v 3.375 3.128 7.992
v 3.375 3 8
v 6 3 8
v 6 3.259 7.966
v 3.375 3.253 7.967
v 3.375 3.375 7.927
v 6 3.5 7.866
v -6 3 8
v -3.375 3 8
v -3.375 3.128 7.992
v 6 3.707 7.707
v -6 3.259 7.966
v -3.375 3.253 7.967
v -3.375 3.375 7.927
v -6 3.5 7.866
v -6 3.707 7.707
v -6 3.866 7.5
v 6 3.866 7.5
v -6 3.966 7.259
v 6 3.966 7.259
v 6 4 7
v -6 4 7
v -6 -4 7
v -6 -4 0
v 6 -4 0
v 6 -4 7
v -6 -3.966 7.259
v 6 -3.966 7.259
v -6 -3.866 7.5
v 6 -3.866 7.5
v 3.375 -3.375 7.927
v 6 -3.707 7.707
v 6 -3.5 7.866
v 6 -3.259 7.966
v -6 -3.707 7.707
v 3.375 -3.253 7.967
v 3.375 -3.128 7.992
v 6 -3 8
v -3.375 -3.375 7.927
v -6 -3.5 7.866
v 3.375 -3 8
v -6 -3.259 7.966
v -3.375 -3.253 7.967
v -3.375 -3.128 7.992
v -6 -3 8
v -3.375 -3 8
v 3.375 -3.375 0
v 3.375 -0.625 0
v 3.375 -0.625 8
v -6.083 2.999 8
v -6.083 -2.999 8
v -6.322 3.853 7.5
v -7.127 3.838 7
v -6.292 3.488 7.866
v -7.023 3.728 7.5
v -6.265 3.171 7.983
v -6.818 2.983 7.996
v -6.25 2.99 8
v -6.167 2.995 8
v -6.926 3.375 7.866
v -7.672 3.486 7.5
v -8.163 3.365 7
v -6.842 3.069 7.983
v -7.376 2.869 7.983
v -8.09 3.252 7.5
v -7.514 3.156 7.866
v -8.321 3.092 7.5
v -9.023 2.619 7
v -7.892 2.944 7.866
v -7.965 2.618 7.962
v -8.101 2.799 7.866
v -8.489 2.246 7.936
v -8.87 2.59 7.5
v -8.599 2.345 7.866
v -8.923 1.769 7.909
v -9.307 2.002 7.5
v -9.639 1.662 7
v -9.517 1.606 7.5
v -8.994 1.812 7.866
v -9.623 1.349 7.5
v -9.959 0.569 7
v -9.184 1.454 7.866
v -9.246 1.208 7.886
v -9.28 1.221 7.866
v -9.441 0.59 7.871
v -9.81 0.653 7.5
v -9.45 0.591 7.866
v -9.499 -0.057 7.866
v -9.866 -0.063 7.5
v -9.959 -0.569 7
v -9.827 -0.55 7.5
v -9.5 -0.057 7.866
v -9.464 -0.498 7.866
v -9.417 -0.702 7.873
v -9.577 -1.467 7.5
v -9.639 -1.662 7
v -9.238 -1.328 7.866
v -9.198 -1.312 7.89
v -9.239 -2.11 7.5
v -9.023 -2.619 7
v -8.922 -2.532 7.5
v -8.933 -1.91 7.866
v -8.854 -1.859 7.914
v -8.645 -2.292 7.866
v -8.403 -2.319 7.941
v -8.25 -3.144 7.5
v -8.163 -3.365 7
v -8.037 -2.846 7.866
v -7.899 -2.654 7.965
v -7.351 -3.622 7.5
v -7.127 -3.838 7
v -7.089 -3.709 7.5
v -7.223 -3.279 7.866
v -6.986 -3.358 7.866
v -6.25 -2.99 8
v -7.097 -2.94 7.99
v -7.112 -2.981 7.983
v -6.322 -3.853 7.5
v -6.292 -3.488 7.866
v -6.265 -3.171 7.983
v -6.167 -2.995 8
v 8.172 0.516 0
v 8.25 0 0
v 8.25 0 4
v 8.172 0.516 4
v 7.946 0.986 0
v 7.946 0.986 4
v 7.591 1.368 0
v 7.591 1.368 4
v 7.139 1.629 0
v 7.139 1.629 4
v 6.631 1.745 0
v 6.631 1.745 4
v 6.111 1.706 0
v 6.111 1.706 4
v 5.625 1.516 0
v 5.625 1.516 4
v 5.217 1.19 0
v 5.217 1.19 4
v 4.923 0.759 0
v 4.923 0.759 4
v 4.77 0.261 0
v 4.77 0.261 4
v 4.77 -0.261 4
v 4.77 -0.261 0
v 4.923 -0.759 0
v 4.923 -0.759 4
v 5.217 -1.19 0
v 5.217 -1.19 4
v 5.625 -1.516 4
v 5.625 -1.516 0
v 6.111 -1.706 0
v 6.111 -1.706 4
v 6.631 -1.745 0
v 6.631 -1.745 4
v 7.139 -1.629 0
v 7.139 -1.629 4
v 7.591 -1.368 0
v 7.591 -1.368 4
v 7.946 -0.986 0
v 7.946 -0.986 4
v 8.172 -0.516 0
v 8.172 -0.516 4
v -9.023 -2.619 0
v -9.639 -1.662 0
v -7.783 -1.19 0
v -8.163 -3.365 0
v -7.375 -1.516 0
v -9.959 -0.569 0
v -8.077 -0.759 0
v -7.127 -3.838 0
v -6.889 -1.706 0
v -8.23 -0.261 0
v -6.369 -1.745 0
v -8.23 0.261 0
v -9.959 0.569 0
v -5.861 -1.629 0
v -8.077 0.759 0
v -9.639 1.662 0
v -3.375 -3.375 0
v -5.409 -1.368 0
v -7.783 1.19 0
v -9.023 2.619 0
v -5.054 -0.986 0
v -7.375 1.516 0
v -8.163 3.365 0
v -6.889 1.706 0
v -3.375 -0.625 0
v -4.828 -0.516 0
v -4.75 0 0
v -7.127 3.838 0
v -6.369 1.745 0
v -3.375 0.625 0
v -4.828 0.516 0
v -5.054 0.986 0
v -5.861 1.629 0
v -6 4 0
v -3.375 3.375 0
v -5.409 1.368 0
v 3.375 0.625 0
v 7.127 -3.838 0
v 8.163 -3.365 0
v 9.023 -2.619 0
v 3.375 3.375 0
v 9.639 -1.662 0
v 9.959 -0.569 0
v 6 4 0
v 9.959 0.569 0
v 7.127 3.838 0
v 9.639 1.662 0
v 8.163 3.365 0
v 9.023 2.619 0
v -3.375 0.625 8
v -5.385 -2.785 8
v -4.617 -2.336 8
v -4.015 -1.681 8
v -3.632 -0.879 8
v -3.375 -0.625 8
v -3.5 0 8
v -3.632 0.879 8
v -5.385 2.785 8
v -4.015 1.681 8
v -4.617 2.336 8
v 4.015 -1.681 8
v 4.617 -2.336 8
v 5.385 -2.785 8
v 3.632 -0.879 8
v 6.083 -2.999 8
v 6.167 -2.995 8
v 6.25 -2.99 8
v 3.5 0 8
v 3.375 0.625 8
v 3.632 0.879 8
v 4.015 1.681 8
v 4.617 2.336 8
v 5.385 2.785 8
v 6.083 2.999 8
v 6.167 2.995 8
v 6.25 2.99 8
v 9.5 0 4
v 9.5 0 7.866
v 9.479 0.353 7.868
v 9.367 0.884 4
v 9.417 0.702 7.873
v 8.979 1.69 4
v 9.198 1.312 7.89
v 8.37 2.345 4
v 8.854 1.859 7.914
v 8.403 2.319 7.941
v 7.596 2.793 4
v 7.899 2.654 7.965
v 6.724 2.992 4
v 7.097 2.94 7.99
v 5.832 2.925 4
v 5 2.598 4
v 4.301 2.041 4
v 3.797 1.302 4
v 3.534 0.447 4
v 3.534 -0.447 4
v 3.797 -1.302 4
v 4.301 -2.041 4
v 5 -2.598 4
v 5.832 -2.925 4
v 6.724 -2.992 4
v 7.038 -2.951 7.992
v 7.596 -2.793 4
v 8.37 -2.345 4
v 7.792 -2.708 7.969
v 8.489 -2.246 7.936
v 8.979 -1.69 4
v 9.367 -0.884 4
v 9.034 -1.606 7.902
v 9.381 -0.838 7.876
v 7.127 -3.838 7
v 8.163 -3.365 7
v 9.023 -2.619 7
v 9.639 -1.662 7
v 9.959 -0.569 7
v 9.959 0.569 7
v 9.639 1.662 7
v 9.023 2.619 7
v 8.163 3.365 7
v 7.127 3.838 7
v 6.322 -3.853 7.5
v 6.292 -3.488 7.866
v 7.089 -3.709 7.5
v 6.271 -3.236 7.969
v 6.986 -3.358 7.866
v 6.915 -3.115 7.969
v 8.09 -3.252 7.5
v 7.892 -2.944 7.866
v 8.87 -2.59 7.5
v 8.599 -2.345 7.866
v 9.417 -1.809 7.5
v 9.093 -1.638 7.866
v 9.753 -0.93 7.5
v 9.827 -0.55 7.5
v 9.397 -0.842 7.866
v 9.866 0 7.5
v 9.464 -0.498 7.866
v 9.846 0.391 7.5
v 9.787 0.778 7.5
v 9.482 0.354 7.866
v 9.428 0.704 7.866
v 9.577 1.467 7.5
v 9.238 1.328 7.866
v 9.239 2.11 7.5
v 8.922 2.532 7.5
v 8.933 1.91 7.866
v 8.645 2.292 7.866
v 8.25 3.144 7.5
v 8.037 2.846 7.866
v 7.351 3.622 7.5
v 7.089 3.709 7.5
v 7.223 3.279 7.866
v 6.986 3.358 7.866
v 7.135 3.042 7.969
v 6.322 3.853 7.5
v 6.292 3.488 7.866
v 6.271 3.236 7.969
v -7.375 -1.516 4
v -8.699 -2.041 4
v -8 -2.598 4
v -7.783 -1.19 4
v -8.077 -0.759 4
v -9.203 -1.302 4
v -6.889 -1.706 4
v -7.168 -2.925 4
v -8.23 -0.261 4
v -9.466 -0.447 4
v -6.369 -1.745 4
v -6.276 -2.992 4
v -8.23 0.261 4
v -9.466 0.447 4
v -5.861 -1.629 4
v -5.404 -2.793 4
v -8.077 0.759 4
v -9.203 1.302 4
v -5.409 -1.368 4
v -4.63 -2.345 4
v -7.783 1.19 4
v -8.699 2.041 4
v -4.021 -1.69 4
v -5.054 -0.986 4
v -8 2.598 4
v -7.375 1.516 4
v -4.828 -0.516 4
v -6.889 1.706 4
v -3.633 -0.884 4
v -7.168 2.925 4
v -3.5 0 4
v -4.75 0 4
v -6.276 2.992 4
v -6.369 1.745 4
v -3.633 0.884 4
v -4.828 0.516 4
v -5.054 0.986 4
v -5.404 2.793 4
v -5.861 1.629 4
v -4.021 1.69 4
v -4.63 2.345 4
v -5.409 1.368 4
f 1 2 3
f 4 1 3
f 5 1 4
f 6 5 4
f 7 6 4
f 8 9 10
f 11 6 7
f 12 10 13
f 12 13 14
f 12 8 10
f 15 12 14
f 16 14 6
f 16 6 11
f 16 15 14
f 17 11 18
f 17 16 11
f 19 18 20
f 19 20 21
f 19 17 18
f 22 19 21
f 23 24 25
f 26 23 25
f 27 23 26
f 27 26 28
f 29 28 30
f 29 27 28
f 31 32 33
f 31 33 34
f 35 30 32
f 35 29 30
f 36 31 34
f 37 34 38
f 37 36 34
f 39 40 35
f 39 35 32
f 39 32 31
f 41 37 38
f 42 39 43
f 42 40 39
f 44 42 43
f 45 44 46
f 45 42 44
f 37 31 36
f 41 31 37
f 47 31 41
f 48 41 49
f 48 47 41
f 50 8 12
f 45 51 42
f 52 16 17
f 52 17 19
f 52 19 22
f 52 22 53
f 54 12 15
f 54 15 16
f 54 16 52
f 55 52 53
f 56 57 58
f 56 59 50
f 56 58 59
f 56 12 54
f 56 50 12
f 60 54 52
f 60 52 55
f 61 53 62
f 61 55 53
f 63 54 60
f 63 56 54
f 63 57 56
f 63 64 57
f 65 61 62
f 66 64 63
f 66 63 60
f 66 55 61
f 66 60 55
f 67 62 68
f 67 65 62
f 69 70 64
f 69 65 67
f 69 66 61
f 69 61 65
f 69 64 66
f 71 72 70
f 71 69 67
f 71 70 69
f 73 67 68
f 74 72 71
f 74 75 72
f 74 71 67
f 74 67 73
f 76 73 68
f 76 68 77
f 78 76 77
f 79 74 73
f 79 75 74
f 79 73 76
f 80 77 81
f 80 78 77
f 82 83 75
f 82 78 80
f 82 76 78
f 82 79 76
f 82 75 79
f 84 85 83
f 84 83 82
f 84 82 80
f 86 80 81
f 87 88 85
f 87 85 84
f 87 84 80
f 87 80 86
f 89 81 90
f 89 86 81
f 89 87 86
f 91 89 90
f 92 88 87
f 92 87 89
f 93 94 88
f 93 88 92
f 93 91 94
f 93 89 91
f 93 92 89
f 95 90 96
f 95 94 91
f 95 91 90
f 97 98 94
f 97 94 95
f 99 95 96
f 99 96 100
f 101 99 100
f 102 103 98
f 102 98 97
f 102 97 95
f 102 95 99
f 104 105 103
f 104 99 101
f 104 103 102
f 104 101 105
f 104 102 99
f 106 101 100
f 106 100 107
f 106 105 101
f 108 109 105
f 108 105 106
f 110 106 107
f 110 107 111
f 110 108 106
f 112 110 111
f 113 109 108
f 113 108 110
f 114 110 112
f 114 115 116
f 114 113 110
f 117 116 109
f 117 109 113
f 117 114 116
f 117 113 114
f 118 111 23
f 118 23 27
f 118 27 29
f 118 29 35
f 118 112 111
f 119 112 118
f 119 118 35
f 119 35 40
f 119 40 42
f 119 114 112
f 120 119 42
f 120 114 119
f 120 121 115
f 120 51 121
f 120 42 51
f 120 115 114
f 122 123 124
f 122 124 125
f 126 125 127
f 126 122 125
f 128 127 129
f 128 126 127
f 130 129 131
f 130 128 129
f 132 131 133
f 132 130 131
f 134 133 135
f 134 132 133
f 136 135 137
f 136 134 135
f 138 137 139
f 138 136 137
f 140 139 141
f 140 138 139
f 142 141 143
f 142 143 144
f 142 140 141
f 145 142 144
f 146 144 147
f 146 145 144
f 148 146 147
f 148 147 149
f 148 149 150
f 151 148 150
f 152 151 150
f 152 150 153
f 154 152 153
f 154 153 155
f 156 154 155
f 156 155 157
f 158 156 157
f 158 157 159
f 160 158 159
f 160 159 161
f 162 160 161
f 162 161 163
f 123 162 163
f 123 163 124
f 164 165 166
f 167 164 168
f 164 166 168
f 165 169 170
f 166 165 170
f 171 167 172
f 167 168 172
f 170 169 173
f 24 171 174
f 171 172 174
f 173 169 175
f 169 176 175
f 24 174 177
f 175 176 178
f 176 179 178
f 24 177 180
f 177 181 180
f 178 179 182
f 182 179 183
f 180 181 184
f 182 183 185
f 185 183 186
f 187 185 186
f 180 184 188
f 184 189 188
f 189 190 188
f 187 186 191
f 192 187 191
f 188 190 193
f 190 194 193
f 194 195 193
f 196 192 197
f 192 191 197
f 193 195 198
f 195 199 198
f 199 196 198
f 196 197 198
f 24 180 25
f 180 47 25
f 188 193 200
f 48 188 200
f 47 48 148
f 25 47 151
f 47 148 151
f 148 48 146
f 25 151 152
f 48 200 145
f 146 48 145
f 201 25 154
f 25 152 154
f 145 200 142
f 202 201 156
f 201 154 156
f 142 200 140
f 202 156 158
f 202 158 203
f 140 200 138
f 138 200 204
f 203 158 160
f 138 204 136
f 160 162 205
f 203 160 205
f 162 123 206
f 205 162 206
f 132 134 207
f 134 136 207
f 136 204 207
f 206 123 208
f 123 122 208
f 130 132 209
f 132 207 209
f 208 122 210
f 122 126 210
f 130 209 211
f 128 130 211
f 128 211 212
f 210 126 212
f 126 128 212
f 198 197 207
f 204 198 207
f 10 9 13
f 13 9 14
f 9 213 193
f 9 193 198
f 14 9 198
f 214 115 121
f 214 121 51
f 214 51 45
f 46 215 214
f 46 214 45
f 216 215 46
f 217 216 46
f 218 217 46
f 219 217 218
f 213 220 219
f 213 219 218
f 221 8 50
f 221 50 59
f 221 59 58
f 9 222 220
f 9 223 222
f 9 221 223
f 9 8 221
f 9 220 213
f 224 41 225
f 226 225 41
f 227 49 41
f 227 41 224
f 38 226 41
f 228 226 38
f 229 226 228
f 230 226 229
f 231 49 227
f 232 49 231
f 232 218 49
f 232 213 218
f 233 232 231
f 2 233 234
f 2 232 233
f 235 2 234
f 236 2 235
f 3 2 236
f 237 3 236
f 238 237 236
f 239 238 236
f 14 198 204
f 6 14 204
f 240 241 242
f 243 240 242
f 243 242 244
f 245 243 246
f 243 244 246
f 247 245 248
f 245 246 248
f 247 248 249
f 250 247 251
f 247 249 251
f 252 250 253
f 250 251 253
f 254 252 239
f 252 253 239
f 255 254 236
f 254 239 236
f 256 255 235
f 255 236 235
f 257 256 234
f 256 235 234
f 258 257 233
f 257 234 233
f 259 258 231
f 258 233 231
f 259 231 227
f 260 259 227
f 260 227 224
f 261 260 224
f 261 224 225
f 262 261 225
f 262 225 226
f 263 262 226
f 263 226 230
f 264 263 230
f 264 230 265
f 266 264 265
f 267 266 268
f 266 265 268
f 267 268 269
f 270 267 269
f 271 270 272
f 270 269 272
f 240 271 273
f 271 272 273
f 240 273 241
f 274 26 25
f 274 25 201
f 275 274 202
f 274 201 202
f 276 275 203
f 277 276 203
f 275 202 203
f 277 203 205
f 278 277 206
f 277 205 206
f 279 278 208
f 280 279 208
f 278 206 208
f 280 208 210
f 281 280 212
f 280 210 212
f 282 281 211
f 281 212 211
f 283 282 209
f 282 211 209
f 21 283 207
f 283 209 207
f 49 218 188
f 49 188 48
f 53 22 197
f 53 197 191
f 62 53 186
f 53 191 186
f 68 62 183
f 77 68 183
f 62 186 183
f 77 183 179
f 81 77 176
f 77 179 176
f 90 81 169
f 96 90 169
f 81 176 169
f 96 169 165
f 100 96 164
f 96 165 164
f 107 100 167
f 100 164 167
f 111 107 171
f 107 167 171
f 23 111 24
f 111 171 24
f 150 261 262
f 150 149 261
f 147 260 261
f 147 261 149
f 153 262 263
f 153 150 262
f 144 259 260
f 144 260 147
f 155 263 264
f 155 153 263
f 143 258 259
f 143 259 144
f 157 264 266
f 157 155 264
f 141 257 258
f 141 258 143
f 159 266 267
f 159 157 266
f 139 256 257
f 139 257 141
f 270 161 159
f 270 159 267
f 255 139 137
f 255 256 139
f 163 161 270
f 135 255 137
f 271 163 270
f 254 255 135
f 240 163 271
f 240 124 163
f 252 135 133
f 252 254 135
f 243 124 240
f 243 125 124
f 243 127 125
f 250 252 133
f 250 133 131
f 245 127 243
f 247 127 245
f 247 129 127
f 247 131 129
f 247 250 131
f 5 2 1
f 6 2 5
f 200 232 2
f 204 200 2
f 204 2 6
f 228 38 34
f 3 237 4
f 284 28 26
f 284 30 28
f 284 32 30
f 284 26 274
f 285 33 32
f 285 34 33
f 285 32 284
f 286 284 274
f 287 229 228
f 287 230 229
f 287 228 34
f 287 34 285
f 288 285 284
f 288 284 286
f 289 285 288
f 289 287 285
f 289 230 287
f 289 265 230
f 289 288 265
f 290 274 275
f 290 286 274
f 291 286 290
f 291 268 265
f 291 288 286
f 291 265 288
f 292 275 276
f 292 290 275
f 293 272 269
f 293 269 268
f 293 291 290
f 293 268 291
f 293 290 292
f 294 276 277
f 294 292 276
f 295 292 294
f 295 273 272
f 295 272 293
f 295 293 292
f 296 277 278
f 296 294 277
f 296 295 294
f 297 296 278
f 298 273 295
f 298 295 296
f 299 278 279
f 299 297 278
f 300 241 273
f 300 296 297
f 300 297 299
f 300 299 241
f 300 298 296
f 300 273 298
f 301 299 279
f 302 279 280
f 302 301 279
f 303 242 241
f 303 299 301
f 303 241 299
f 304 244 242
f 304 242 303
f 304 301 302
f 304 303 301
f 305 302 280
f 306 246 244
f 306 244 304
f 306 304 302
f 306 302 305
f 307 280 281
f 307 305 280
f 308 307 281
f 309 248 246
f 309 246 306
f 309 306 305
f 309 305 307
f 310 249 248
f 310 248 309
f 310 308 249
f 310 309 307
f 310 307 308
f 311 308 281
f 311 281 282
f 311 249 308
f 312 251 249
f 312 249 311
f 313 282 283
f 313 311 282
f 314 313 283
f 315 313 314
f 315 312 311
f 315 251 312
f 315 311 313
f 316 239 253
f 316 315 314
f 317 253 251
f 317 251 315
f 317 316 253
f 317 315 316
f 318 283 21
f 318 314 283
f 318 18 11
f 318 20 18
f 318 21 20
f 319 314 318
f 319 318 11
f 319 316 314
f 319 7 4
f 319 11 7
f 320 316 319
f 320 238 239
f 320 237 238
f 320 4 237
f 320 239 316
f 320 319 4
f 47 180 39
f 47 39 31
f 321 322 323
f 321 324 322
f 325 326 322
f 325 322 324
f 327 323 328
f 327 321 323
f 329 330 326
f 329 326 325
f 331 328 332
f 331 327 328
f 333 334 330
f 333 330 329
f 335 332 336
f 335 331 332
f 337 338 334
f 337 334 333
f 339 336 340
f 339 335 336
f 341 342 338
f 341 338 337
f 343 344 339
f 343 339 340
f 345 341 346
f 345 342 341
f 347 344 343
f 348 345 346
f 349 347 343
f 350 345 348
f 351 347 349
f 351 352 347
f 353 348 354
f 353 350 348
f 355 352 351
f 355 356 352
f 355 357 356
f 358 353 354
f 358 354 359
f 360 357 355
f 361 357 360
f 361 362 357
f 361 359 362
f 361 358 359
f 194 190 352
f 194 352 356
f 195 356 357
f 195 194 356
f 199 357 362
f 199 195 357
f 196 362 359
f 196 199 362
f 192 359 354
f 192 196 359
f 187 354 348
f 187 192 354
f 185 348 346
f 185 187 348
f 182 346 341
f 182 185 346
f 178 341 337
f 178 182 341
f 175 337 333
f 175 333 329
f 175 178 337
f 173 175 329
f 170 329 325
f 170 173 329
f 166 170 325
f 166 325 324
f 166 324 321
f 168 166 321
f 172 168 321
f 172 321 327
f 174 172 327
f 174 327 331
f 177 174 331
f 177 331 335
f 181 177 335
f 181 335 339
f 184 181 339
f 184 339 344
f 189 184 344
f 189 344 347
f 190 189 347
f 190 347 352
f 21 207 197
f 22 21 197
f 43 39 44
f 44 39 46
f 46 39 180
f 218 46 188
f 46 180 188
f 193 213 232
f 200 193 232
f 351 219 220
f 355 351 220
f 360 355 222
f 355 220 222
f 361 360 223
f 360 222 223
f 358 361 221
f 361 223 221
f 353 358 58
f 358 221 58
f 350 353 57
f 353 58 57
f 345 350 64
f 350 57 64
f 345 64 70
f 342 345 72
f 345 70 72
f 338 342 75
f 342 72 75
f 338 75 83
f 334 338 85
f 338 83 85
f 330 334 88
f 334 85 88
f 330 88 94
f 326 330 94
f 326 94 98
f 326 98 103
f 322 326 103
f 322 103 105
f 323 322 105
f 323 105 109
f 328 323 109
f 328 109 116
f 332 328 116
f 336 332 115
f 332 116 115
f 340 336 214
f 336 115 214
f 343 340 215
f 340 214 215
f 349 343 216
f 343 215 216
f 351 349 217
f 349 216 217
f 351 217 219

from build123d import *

# Parameters (mm, degrees)
F0_W        = 6.75
F0_H        = 2.75
F0_R        = 1.75
F1_DEPTH    = 8
F2_R        = 3
F2_R_2      = 1.75
F3_DEPTH    = 4
F4_T1_DEPTH = 12
F4_T4_ANGLE = 180
F4_T6_ANGLE = 180


# Not quite as in the source:
# - a fillet or chamfer that OpenCascade refuses, or shapes differently, is made with other operations: its cross-section is extruded or revolved along the edge and cut away or added


with BuildPart() as f1:
    # F0 (on Top) → F1 (new body)
    with BuildSketch(Plane.XY):
        with BuildLine():
            ThreePointArc((6, -4), (10, 0), (6, 4))
            Line((6, 4), (-6, 4))
            ThreePointArc((-6, 4), (-10, 0), (-6, -4))
            Line((-6, -4), (6, -4))
        make_face()
        with Locations((0, -2)):
            Rectangle(F0_W, F0_H, mode=Mode.SUBTRACT)
        with Locations((-6.5, 0)):
            Circle(F0_R, mode=Mode.SUBTRACT)
        with Locations((6.5, 0)):
            Circle(F0_R, mode=Mode.SUBTRACT)
        with Locations((0, 2)):
            Rectangle(F0_W, F0_H, mode=Mode.SUBTRACT)
    extrude(amount=F1_DEPTH)

    # F2 (on face) → F3 (cut)
    with BuildSketch(Plane.XY.offset(8)):
        with Locations((-6.5, 0)):
            Circle(F2_R)
        with Locations((-6.5, 0)):
            Circle(F2_R_2, mode=Mode.SUBTRACT)
        with Locations((6.5, 0)):
            Circle(F2_R)
        with Locations((6.5, 0)):
            Circle(F2_R_2, mode=Mode.SUBTRACT)
    extrude(amount=-F3_DEPTH, mode=Mode.SUBTRACT)

    # F4: fillet of radius 1 on 1 edges, made by hand

    # F4_s2 → F4_t1 (cut)
    with BuildSketch(Plane.YZ.offset(-6)):
        with BuildLine():
            ThreePointArc((-4, 7), (-3.7071067812, 7.7071067812), (-3, 8))
            Line((-3, 8), (-4, 8))
            Line((-4, 8), (-4, 7))
        make_face()
        with BuildLine():
            ThreePointArc((3, 8), (3.7071067812, 7.7071067812), (4, 7))
            Line((4, 7), (4, 8))
            Line((4, 8), (3, 8))
        make_face()
    extrude(amount=F4_T1_DEPTH, mode=Mode.SUBTRACT)

    # F4_s3 → F4_t4 (revolve, cut)
    with BuildSketch(Plane.YZ.offset(6)):
        with BuildLine():
            ThreePointArc((-4, 7), (-3.7071067812, 7.7071067812), (-3, 8))
            Line((-3, 8), (-4, 8))
            Line((-4, 8), (-4, 7))
        make_face()
    revolve(axis=Axis((6, 0, 8), (0, 0, 1)), revolution_arc=F4_T4_ANGLE, mode=Mode.SUBTRACT)

    # F4_s5 → F4_t6 (revolve, cut)
    with BuildSketch(Plane.YZ.offset(-6)):
        with BuildLine():
            ThreePointArc((4, 7), (3.7071067812, 7.7071067812), (3, 8))
            Line((3, 8), (4, 8))
            Line((4, 8), (4, 7))
        make_face()
    revolve(axis=Axis((-6, 0, 8), (0, 0, 1)), revolution_arc=F4_T6_ANGLE, mode=Mode.SUBTRACT)


solid = f1.part
